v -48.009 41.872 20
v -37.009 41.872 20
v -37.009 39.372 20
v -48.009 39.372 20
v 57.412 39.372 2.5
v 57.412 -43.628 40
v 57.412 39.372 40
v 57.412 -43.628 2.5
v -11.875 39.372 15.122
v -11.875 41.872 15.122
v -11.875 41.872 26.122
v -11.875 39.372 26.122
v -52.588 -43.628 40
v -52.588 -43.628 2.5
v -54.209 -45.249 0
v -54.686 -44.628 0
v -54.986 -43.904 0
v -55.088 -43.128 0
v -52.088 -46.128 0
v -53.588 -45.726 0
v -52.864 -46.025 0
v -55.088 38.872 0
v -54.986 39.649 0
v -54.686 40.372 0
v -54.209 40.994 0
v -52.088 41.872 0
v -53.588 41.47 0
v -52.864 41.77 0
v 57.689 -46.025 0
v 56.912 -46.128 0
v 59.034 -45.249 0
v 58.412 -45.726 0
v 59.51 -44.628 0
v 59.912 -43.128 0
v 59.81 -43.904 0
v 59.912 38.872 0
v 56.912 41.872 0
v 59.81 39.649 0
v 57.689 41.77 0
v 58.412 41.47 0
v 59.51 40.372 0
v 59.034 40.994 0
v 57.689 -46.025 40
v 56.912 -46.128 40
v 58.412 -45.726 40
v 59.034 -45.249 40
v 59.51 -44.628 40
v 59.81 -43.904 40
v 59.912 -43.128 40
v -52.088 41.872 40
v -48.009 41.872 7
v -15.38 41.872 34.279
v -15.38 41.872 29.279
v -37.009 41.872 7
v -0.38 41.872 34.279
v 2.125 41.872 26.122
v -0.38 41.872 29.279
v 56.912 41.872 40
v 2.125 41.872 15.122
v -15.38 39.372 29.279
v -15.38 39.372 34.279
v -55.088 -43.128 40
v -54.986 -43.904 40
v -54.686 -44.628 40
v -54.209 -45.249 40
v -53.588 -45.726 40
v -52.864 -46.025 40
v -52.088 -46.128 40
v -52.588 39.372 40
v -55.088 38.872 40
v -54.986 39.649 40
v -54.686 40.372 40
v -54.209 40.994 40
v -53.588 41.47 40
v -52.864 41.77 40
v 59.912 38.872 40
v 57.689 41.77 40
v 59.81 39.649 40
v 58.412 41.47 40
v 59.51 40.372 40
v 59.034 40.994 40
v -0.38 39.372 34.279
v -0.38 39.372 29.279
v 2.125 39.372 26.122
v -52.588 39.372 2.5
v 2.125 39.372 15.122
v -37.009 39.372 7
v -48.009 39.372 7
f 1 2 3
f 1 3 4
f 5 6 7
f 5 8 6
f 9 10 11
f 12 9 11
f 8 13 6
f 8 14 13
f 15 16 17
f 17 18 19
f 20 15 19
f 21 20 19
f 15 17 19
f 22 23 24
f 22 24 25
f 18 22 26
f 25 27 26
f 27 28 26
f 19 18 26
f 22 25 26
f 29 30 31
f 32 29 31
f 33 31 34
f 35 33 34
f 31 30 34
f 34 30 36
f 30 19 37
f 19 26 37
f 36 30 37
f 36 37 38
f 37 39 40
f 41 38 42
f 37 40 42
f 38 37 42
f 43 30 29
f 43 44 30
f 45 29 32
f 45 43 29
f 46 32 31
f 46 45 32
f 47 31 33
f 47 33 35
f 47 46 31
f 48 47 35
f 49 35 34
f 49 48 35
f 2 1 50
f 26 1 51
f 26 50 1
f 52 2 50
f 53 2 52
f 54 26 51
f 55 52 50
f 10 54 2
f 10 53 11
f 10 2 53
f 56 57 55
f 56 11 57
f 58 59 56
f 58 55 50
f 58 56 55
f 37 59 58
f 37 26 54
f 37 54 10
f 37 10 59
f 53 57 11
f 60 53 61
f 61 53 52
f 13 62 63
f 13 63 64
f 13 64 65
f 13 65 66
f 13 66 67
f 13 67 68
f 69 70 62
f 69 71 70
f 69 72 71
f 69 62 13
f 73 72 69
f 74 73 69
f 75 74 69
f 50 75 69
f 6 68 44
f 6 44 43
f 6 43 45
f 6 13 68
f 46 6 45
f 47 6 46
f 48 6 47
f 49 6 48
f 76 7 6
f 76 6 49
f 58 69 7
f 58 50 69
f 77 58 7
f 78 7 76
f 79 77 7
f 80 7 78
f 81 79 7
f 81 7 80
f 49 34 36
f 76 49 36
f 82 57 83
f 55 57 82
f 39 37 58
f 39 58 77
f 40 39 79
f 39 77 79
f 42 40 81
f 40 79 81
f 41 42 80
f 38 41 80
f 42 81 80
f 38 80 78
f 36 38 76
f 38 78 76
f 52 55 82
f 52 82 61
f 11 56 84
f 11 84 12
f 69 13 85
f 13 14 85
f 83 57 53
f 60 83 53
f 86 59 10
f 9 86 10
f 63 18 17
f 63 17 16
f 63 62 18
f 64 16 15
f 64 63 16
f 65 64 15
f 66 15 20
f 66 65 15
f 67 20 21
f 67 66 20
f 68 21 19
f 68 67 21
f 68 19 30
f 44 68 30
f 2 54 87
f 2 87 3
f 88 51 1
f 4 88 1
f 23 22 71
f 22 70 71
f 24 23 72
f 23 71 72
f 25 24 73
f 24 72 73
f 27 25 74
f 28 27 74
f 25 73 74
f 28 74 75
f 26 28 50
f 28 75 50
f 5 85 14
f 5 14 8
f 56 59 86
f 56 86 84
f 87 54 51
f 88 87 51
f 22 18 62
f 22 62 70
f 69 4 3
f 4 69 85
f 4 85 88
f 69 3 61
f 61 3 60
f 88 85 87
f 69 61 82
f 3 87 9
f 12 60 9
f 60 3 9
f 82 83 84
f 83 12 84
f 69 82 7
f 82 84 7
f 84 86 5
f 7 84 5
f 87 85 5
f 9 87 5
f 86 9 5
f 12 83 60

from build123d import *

# Parameters (mm, degrees)
F0_W     = 115
F0_H     = 88
F1_DEPTH = 40
F2_T     = -2.5
F3_W     = 15
F3_H     = 5
F3_W_2   = 14
F3_H_2   = 11
F3_W_3   = 11
F3_H_3   = 13
F4_DEPTH = 2.5
F5_R     = 3


with BuildPart() as f1:
    # F0 (on Top) → F1 (new body)
    with BuildSketch(Plane.XY):
        with Locations((2.412276, -2.127609)):
            Rectangle(F0_W, F0_H)
    extrude(amount=F1_DEPTH)

    # F2
    f2_openings = [f1.faces().sort_by_distance(p)[0] for p in [
        (2.412276, -2.127609, 40),
    ]]
    offset(amount=F2_T, openings=f2_openings)

    # F3 (on face) → F4 (cut)
    with BuildSketch(Plane(origin=(0, 41.872391, 0), x_dir=(-1, 0, 0), z_dir=(0, 1, 0))):
        with Locations((7.879983, 31.778646)):
            Rectangle(F3_W, F3_H)
        with Locations((4.874999, 20.622397)):
            Rectangle(F3_W_2, F3_H_2)
        with Locations((42.508882, 13.5)):
            Rectangle(F3_W_3, F3_H_3)
    extrude(amount=-F4_DEPTH, mode=Mode.SUBTRACT)

    # F5
    f5_edges = [f1.edges().sort_by_distance(p)[0] for p in [
        (59.912276, -46.127609, 20),
        (-55.087724, -46.127609, 20),
        (-55.087724, 41.872391, 20),
        (59.912276, 41.872391, 20),
    ]]
    fillet(f5_edges, radius=F5_R)


solid = f1.part
